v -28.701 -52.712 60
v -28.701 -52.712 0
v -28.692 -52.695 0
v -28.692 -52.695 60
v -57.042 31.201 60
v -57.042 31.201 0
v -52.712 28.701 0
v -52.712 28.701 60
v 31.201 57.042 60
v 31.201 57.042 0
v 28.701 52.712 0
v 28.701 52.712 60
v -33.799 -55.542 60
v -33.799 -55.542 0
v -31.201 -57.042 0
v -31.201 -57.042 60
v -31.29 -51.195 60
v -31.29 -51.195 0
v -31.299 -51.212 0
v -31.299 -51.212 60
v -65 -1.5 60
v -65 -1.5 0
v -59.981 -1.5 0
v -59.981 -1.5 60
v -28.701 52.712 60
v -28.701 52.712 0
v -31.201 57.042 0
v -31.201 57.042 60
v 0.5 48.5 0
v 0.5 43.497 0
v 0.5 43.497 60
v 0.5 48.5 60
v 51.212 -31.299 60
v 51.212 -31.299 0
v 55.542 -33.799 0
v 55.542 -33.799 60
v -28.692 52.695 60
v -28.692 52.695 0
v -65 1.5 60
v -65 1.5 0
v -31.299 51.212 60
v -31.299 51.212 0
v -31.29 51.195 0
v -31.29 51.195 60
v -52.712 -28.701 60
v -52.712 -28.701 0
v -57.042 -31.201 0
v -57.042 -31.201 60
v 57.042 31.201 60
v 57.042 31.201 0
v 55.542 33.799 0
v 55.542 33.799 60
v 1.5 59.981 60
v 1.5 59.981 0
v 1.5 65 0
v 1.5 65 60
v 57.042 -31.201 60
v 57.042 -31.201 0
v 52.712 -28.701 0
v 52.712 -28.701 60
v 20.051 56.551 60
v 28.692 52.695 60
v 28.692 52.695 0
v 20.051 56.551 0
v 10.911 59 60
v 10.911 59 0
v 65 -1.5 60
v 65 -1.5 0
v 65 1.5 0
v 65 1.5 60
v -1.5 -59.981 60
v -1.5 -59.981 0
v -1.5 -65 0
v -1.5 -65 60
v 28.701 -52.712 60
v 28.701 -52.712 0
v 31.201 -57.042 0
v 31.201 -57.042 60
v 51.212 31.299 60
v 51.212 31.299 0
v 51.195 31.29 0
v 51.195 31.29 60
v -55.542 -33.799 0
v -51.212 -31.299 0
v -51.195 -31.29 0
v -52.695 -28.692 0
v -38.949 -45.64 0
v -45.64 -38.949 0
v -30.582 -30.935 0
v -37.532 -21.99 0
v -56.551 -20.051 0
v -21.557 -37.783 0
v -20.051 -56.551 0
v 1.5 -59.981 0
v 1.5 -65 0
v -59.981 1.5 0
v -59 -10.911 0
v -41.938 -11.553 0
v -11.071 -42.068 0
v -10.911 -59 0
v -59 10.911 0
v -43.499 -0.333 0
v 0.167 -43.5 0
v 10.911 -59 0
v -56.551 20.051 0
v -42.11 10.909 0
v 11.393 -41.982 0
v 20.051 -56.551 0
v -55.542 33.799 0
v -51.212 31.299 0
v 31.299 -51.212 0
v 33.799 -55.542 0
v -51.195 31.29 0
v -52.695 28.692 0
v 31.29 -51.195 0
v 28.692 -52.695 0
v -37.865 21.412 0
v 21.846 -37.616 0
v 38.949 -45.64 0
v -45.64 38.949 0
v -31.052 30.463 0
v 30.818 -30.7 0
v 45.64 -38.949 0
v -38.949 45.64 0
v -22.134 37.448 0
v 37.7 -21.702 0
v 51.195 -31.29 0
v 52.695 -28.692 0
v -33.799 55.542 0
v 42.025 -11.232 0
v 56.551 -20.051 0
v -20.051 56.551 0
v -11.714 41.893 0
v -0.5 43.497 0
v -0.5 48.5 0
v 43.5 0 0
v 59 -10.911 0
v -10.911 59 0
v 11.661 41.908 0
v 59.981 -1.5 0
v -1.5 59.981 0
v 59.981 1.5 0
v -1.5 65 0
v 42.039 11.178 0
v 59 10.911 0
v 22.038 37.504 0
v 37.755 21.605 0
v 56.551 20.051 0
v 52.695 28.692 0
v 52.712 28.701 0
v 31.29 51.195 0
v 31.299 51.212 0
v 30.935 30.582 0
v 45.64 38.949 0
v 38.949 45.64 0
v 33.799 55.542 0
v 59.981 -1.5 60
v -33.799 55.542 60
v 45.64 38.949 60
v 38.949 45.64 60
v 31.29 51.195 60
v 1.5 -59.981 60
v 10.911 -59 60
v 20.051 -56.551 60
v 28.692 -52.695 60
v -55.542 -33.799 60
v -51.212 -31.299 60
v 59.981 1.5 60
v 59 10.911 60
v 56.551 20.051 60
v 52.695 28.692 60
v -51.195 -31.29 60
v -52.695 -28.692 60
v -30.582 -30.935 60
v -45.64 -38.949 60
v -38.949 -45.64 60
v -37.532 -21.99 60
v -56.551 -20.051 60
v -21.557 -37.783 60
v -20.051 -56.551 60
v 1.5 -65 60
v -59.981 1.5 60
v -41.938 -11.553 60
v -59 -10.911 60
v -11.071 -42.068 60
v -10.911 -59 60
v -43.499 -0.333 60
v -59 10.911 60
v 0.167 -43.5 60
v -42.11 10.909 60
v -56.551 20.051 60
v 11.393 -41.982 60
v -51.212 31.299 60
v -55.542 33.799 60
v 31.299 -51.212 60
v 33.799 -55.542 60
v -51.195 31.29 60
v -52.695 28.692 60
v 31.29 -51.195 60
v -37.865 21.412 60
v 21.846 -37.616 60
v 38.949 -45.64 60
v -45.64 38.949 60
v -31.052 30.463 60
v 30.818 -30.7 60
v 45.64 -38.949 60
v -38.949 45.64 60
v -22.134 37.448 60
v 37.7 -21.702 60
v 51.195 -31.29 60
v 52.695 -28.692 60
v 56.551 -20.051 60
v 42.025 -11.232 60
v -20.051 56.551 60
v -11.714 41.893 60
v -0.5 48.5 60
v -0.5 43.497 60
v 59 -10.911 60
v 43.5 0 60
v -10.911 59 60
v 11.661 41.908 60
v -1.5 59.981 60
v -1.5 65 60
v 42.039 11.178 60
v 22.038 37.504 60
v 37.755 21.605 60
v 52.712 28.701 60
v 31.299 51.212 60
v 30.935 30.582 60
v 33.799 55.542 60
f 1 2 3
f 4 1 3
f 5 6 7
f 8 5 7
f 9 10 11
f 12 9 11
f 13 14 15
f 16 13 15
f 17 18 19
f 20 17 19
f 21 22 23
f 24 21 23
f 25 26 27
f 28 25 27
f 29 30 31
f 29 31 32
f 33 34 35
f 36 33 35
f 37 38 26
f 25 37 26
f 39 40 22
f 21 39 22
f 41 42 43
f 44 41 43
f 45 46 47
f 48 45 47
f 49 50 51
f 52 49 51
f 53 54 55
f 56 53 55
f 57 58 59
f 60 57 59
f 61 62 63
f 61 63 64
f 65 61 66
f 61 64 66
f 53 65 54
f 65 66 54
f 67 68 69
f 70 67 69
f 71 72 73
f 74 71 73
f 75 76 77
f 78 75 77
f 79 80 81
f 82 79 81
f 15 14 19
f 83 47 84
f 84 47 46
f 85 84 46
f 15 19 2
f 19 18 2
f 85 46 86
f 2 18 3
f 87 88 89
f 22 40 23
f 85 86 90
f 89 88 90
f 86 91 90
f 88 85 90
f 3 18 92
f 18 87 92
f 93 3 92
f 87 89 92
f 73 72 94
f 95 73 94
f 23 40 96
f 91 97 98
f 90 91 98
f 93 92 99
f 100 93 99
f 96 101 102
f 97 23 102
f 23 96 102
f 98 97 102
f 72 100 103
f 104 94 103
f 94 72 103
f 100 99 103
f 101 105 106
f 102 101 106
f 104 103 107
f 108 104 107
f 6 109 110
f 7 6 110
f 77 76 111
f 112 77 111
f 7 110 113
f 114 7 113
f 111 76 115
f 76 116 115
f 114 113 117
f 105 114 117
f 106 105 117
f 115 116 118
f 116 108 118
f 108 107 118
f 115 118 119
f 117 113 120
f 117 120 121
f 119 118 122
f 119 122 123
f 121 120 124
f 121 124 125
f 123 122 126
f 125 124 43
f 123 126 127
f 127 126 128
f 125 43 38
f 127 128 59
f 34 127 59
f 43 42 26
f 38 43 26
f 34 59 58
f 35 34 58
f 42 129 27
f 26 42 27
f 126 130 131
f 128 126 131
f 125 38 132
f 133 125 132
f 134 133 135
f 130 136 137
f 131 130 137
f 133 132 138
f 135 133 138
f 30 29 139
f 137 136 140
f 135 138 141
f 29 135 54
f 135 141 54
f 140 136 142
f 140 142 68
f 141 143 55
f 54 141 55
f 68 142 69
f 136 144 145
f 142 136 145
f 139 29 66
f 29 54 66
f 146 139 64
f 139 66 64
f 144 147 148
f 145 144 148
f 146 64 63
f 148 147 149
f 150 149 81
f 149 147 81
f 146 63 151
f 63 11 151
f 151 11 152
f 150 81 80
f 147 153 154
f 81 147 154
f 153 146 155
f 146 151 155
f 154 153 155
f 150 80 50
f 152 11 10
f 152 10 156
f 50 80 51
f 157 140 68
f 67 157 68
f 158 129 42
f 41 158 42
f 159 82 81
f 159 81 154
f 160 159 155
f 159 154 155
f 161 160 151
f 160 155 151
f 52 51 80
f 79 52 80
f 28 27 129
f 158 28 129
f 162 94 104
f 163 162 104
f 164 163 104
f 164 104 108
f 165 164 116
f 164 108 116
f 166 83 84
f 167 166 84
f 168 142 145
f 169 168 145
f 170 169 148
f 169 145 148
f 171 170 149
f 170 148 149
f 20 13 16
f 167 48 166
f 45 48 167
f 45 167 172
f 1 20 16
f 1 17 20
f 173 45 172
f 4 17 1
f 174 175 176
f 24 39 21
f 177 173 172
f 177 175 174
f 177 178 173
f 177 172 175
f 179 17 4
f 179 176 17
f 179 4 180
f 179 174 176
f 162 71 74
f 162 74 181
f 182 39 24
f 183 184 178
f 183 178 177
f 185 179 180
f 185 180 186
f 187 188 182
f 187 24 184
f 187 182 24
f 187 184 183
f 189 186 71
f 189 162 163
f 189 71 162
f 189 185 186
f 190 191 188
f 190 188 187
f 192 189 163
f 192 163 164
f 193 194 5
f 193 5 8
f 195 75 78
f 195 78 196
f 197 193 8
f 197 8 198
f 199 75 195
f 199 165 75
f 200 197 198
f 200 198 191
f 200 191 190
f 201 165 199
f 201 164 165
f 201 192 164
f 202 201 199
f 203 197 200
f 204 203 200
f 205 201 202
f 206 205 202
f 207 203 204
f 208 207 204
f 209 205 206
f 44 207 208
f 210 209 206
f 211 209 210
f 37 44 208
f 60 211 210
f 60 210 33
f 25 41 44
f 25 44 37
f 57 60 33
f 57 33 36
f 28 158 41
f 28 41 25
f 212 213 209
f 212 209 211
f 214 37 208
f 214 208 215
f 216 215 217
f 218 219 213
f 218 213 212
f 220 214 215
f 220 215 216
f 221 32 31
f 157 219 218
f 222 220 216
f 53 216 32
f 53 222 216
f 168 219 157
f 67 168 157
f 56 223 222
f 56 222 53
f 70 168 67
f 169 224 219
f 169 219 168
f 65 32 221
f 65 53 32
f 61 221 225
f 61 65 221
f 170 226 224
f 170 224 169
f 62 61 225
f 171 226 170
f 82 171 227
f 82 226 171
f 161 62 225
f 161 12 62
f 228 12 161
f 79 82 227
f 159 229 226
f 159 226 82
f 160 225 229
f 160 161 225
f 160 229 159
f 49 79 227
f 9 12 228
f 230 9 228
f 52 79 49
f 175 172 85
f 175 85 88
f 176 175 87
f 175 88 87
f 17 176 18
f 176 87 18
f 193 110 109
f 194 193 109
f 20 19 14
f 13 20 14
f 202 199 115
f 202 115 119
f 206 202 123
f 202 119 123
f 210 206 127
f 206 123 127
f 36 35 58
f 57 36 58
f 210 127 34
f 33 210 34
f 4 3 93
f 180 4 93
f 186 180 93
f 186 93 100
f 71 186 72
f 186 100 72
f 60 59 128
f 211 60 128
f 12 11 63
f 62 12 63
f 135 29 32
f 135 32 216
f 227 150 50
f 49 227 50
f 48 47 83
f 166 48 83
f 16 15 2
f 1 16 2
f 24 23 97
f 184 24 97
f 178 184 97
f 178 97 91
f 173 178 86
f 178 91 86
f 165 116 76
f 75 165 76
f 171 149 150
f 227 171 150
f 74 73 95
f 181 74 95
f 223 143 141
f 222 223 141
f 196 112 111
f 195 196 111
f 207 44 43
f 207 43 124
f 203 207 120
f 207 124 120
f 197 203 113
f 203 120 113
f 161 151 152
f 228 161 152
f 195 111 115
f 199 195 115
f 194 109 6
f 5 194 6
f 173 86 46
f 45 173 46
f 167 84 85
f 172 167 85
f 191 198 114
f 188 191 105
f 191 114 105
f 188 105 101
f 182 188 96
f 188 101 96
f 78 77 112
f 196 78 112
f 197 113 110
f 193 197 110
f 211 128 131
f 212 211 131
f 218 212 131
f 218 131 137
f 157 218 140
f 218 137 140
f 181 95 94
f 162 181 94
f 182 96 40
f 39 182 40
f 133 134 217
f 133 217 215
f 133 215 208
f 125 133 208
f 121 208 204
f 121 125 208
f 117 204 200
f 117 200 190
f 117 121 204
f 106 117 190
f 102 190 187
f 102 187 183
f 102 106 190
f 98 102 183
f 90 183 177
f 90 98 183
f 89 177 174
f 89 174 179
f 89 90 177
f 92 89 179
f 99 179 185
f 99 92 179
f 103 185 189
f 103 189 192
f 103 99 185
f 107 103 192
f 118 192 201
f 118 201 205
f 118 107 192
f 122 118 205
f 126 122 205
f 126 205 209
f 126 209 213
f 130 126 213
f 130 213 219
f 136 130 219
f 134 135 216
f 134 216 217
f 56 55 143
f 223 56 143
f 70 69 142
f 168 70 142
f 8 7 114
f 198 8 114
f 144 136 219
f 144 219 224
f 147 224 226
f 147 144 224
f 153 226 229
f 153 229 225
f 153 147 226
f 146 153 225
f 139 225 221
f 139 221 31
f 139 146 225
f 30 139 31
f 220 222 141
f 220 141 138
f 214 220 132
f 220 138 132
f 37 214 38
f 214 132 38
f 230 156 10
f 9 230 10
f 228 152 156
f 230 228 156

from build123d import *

# Parameters (mm, degrees)
SKETCH1_R           = 60
SKETCH1_R_2         = 43.5
EXTRUSION1_DEPTH    = 60
EXTRUSION3_START    = -60
EXTRUSION3_DEPTH    = 60
BOSS_EXTRUDE1_START = -60
BOSS_EXTRUDE1_DEPTH = 60


with BuildPart() as part:
    # Sketch1 → Extrusion1 (new body)
    with BuildSketch(Plane.XY):
        Circle(SKETCH1_R)
        Circle(SKETCH1_R_2, mode=Mode.SUBTRACT)
    extrude(amount=EXTRUSION1_DEPTH)

    # Sketch3 → Extrusion3 (cut)
    with BuildSketch(Plane.XY.offset(60).offset(EXTRUSION3_START)):
        with BuildLine():
            Line((-0.5, 48.5), (-0.5, 43.497126342))
            ThreePointArc((-0.5, 43.497126342), (0, 43.5), (0.5, 43.497126342))
            Line((0.5, 43.497126342), (0.5, 48.5))
            Line((0.5, 48.5), (-0.5, 48.5))
        make_face()
    extrude(amount=EXTRUSION3_DEPTH, mode=Mode.SUBTRACT)

    # Sketch4 → Boss-Extrude1 (add)
    with BuildSketch(Plane.XY.offset(60).offset(BOSS_EXTRUDE1_START)):
        with BuildLine():
            Line((31.28966164, 51.195283713), (31.299038106, 51.211524227))
            Line((31.299038106, 51.211524227), (33.799038106, 55.541651246))
            Line((33.799038106, 55.541651246), (31.200961894, 57.041651246))
            Line((31.200961894, 57.041651246), (28.700961894, 52.711524227))
            Line((28.700961894, 52.711524227), (28.691585429, 52.695283713))
            ThreePointArc((28.691585429, 52.695283713), (30, 51.961524227), (31.28966164, 51.195283713))
        make_face()
        with BuildLine():
            Line((1.5, 59.981247069), (1.5, 60))
            Line((1.5, 60), (1.5, 65))
            Line((1.5, 65), (-1.5, 65))
            Line((-1.5, 65), (-1.5, 60))
            Line((-1.5, 60), (-1.5, 59.981247069))
            ThreePointArc((-1.5, 59.981247069), (0, 60), (1.5, 59.981247069))
        make_face()
        with BuildLine():
            Line((52.695283713, 28.691585429), (52.711524227, 28.700961894))
            Line((52.711524227, 28.700961894), (57.041651246, 31.200961894))
            Line((57.041651246, 31.200961894), (55.541651246, 33.799038106))
            Line((55.541651246, 33.799038106), (51.211524227, 31.299038106))
            Line((51.211524227, 31.299038106), (51.195283713, 31.28966164))
            ThreePointArc((51.195283713, 31.28966164), (51.961524227, 30), (52.695283713, 28.691585429))
        make_face()
        with BuildLine():
            Line((59.981247069, -1.5), (60, -1.5))
            Line((60, -1.5), (65, -1.5))
            Line((65, -1.5), (65, 1.5))
            Line((65, 1.5), (60, 1.5))
            Line((60, 1.5), (59.981247069, 1.5))
            ThreePointArc((59.981247069, 1.5), (60, 0), (59.981247069, -1.5))
        make_face()
        with BuildLine():
            Line((51.195283713, -31.28966164), (51.211524227, -31.299038106))
            Line((51.211524227, -31.299038106), (55.541651246, -33.799038106))
            Line((55.541651246, -33.799038106), (57.041651246, -31.200961894))
            Line((57.041651246, -31.200961894), (52.711524227, -28.700961894))
            Line((52.711524227, -28.700961894), (52.695283713, -28.691585429))
            ThreePointArc((52.695283713, -28.691585429), (51.961524227, -30), (51.195283713, -31.28966164))
        make_face()
        with BuildLine():
            Line((28.691585429, -52.695283713), (28.700961894, -52.711524227))
            Line((28.700961894, -52.711524227), (31.200961894, -57.041651246))
            Line((31.200961894, -57.041651246), (33.799038106, -55.541651246))
            Line((33.799038106, -55.541651246), (31.299038106, -51.211524227))
            Line((31.299038106, -51.211524227), (31.28966164, -51.195283713))
            ThreePointArc((31.28966164, -51.195283713), (30, -51.961524227), (28.691585429, -52.695283713))
        make_face()
        with BuildLine():
            Line((-1.5, -59.981247069), (-1.5, -60))
            Line((-1.5, -60), (-1.5, -65))
            Line((-1.5, -65), (1.5, -65))
            Line((1.5, -65), (1.5, -60))
            Line((1.5, -60), (1.5, -59.981247069))
            ThreePointArc((1.5, -59.981247069), (0, -60), (-1.5, -59.981247069))
        make_face()
        with BuildLine():
            Line((-31.28966164, -51.195283713), (-31.299038106, -51.211524227))
            Line((-31.299038106, -51.211524227), (-33.799038106, -55.541651246))
            Line((-33.799038106, -55.541651246), (-31.200961894, -57.041651246))
            Line((-31.200961894, -57.041651246), (-28.700961894, -52.711524227))
            Line((-28.700961894, -52.711524227), (-28.691585429, -52.695283713))
            ThreePointArc((-28.691585429, -52.695283713), (-30, -51.961524227), (-31.28966164, -51.195283713))
        make_face()
        with BuildLine():
            Line((-52.695283713, -28.691585429), (-52.711524227, -28.700961894))
            Line((-52.711524227, -28.700961894), (-57.041651246, -31.200961894))
            Line((-57.041651246, -31.200961894), (-55.541651246, -33.799038106))
            Line((-55.541651246, -33.799038106), (-51.211524227, -31.299038106))
            Line((-51.211524227, -31.299038106), (-51.195283713, -31.28966164))
            ThreePointArc((-51.195283713, -31.28966164), (-51.961524227, -30), (-52.695283713, -28.691585429))
        make_face()
        with BuildLine():
            Line((-59.981247069, 1.5), (-60, 1.5))
            Line((-60, 1.5), (-65, 1.5))
            Line((-65, 1.5), (-65, -1.5))
            Line((-65, -1.5), (-60, -1.5))
            Line((-60, -1.5), (-59.981247069, -1.5))
            ThreePointArc((-59.981247069, -1.5), (-60, 0), (-59.981247069, 1.5))
        make_face()
        with BuildLine():
            Line((-51.195283713, 31.28966164), (-51.211524227, 31.299038106))
            Line((-51.211524227, 31.299038106), (-55.541651246, 33.799038106))
            Line((-55.541651246, 33.799038106), (-57.041651246, 31.200961894))
            Line((-57.041651246, 31.200961894), (-52.711524227, 28.700961894))
            Line((-52.711524227, 28.700961894), (-52.695283713, 28.691585429))
            ThreePointArc((-52.695283713, 28.691585429), (-51.961524227, 30), (-51.195283713, 31.28966164))
        make_face()
        with BuildLine():
            Line((-28.691585429, 52.695283713), (-28.700961894, 52.711524227))
            Line((-28.700961894, 52.711524227), (-31.200961894, 57.041651246))
            Line((-31.200961894, 57.041651246), (-33.799038106, 55.541651246))
            Line((-33.799038106, 55.541651246), (-31.299038106, 51.211524227))
            Line((-31.299038106, 51.211524227), (-31.28966164, 51.195283713))
            ThreePointArc((-31.28966164, 51.195283713), (-30, 51.961524227), (-28.691585429, 52.695283713))
        make_face()
    extrude(amount=BOSS_EXTRUDE1_DEPTH)


solid = part.part
